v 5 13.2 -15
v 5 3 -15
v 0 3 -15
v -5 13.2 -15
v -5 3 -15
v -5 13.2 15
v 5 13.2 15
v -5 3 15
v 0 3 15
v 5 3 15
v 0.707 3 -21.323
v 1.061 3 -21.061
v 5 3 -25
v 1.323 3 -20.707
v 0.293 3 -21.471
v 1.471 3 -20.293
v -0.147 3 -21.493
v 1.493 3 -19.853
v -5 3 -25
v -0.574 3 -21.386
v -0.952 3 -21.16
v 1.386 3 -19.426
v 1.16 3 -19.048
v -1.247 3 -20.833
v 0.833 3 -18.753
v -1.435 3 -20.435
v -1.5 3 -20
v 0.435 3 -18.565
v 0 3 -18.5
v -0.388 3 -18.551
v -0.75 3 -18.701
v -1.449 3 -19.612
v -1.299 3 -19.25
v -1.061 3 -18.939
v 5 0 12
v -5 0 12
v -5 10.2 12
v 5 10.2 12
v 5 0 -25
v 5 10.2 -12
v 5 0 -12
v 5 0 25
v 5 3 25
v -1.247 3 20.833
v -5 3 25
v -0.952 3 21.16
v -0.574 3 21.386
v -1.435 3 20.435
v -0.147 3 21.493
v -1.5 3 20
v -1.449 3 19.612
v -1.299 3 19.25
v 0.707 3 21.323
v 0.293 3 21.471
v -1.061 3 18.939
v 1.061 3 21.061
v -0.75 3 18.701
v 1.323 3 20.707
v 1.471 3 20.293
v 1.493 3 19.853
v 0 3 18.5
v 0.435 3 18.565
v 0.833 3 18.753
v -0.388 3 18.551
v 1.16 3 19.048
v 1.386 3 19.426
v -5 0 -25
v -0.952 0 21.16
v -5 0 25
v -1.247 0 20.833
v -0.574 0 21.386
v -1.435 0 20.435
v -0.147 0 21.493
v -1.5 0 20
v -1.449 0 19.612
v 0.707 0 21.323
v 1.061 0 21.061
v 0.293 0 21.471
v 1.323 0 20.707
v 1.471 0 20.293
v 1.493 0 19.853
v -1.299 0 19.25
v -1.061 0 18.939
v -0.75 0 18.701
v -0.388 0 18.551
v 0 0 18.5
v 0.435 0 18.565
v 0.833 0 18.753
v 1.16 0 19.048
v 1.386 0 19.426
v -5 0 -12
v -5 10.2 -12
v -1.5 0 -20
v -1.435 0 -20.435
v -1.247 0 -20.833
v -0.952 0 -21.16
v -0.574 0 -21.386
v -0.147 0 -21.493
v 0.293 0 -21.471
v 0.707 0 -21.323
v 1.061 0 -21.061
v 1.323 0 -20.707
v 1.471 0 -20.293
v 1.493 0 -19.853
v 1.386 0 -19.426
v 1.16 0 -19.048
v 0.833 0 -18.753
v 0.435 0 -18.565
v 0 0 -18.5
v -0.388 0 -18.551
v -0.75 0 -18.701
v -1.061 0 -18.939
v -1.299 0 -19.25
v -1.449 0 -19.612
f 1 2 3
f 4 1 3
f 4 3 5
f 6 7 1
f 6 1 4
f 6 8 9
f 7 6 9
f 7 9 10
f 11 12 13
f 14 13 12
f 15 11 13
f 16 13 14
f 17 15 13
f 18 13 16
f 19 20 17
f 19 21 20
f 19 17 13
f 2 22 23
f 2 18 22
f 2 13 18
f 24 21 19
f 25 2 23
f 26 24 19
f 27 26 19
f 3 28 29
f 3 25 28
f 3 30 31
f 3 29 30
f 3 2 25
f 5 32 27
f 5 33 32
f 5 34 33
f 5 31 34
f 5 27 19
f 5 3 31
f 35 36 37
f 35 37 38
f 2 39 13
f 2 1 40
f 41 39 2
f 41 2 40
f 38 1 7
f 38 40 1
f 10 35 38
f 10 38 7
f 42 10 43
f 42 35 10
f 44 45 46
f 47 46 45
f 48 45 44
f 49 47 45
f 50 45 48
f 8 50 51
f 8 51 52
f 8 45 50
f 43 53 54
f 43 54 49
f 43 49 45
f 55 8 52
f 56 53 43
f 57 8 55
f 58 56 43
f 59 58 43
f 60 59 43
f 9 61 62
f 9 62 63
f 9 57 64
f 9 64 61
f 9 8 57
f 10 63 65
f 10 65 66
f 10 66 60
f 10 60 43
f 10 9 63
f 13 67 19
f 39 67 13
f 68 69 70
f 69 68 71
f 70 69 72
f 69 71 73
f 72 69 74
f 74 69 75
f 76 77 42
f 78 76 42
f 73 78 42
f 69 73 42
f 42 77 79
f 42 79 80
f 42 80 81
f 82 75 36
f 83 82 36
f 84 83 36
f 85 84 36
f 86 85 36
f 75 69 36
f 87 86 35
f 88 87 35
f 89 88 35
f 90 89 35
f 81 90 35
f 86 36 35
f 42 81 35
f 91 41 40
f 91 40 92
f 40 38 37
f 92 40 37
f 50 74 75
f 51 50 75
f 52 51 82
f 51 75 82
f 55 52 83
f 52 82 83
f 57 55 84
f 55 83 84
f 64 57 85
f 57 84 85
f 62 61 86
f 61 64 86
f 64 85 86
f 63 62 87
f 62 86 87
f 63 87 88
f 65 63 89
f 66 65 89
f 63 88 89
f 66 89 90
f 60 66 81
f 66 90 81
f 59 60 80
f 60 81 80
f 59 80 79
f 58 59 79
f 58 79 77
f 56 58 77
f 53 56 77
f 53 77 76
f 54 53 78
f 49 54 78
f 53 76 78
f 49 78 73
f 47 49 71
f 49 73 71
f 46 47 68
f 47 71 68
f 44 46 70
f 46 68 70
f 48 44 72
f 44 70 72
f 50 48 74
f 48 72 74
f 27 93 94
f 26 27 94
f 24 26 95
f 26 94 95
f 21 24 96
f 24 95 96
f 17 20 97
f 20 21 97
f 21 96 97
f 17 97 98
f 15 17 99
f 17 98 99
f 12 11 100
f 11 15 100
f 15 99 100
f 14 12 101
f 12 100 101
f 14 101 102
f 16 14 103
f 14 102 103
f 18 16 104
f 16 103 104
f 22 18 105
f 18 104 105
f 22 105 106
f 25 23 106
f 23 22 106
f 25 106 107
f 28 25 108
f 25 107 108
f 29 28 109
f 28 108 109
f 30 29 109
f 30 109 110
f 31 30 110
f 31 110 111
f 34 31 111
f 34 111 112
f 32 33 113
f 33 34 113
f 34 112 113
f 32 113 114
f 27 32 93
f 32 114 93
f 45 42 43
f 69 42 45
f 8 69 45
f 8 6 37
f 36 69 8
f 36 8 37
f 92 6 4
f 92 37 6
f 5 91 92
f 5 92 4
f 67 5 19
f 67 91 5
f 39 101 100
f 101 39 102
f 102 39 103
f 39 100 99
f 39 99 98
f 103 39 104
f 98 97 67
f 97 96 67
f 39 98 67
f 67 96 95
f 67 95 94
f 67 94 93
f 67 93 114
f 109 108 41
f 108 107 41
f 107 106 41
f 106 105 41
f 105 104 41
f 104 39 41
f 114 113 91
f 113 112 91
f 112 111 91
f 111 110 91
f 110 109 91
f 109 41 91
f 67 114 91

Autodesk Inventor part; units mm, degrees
ref_plane "YZ Plane" through (0, 0, 0) normal (1, 0, 0) x (0, 1, 0)
ref_plane "XZ Plane" through (0, 0, 0) normal (0, 1, 0) x (-1, 0, 0)
ref_plane "XY Plane" through (0, 0, 0) normal (0, 0, 1) x (1, 0, 0)
sketch "Эскиз1" plane through (0, 0, 0) normal (0, 1, 0) x (-1, 0, 0)
  line L0 (0, 0) -> (0, -12)
  line L1 (0, -12) -> (0, -20)
  line L2 (-5, -15) -> (5, -15)
  line L3 (5, -15) -> (5, -25)
  line L4 (5, -25) -> (-5, -25)
  line L5 (-5, -25) -> (-5, -15)
  line L6 (-5, -15) -> (5, -25) construction
  line L7 (5, -15) -> (-5, -25) construction
  circle A0 centre (0, -20) radius 1.5
  dimension "d0" = 12
  dimension "d1" = 8
  dimension "d2" = 10
  dimension "d3" = 10
  dimension "d4" = 3
extrude "Выдавливание1" add sketch "Эскиз1" along normal blind 3
sketch "Эскиз2" plane through (0, 3, 0) normal (0, 1, 0) x (1, 0, 0)
  line L0 (-5, 15) -> (5, 15) projected
  line L1 (-5, 15) -> (5, 15)
  line L2 (5, 15) -> (5, 12)
  line L3 (5, 12) -> (-5, 12)
  line L4 (-5, 12) -> (-5, 15)
  point P0 (0, 0)
  dimension "d7" = 3
extrude "Выдавливание2" add sketch "Эскиз2" along normal blind 7.2 and the other way blind 3
sketch "Эскиз3" plane through (0, 10.2, 0) normal (0, 1, 0) x (1, 0, 0)
  line L0 (5, 15) -> (-5, 15) projected
  line L1 (5, 15) -> (-5, 15)
  line L2 (-5, 15) -> (-5, 0)
  line L3 (-5, 0) -> (5, 0)
  line L4 (5, 0) -> (5, 15)
  point P0 (0, 0)
  dimension "d12" = 10
extrude "Выдавливание3" add sketch "Эскиз3" along normal blind 3
mirror "Зеркальное отражение1" about plane through (0, 0, 0) normal (0, 0, 1) of "Выдавливание2", "Выдавливание3", "Выдавливание1"
properties part number "000.210 - Скоба"
